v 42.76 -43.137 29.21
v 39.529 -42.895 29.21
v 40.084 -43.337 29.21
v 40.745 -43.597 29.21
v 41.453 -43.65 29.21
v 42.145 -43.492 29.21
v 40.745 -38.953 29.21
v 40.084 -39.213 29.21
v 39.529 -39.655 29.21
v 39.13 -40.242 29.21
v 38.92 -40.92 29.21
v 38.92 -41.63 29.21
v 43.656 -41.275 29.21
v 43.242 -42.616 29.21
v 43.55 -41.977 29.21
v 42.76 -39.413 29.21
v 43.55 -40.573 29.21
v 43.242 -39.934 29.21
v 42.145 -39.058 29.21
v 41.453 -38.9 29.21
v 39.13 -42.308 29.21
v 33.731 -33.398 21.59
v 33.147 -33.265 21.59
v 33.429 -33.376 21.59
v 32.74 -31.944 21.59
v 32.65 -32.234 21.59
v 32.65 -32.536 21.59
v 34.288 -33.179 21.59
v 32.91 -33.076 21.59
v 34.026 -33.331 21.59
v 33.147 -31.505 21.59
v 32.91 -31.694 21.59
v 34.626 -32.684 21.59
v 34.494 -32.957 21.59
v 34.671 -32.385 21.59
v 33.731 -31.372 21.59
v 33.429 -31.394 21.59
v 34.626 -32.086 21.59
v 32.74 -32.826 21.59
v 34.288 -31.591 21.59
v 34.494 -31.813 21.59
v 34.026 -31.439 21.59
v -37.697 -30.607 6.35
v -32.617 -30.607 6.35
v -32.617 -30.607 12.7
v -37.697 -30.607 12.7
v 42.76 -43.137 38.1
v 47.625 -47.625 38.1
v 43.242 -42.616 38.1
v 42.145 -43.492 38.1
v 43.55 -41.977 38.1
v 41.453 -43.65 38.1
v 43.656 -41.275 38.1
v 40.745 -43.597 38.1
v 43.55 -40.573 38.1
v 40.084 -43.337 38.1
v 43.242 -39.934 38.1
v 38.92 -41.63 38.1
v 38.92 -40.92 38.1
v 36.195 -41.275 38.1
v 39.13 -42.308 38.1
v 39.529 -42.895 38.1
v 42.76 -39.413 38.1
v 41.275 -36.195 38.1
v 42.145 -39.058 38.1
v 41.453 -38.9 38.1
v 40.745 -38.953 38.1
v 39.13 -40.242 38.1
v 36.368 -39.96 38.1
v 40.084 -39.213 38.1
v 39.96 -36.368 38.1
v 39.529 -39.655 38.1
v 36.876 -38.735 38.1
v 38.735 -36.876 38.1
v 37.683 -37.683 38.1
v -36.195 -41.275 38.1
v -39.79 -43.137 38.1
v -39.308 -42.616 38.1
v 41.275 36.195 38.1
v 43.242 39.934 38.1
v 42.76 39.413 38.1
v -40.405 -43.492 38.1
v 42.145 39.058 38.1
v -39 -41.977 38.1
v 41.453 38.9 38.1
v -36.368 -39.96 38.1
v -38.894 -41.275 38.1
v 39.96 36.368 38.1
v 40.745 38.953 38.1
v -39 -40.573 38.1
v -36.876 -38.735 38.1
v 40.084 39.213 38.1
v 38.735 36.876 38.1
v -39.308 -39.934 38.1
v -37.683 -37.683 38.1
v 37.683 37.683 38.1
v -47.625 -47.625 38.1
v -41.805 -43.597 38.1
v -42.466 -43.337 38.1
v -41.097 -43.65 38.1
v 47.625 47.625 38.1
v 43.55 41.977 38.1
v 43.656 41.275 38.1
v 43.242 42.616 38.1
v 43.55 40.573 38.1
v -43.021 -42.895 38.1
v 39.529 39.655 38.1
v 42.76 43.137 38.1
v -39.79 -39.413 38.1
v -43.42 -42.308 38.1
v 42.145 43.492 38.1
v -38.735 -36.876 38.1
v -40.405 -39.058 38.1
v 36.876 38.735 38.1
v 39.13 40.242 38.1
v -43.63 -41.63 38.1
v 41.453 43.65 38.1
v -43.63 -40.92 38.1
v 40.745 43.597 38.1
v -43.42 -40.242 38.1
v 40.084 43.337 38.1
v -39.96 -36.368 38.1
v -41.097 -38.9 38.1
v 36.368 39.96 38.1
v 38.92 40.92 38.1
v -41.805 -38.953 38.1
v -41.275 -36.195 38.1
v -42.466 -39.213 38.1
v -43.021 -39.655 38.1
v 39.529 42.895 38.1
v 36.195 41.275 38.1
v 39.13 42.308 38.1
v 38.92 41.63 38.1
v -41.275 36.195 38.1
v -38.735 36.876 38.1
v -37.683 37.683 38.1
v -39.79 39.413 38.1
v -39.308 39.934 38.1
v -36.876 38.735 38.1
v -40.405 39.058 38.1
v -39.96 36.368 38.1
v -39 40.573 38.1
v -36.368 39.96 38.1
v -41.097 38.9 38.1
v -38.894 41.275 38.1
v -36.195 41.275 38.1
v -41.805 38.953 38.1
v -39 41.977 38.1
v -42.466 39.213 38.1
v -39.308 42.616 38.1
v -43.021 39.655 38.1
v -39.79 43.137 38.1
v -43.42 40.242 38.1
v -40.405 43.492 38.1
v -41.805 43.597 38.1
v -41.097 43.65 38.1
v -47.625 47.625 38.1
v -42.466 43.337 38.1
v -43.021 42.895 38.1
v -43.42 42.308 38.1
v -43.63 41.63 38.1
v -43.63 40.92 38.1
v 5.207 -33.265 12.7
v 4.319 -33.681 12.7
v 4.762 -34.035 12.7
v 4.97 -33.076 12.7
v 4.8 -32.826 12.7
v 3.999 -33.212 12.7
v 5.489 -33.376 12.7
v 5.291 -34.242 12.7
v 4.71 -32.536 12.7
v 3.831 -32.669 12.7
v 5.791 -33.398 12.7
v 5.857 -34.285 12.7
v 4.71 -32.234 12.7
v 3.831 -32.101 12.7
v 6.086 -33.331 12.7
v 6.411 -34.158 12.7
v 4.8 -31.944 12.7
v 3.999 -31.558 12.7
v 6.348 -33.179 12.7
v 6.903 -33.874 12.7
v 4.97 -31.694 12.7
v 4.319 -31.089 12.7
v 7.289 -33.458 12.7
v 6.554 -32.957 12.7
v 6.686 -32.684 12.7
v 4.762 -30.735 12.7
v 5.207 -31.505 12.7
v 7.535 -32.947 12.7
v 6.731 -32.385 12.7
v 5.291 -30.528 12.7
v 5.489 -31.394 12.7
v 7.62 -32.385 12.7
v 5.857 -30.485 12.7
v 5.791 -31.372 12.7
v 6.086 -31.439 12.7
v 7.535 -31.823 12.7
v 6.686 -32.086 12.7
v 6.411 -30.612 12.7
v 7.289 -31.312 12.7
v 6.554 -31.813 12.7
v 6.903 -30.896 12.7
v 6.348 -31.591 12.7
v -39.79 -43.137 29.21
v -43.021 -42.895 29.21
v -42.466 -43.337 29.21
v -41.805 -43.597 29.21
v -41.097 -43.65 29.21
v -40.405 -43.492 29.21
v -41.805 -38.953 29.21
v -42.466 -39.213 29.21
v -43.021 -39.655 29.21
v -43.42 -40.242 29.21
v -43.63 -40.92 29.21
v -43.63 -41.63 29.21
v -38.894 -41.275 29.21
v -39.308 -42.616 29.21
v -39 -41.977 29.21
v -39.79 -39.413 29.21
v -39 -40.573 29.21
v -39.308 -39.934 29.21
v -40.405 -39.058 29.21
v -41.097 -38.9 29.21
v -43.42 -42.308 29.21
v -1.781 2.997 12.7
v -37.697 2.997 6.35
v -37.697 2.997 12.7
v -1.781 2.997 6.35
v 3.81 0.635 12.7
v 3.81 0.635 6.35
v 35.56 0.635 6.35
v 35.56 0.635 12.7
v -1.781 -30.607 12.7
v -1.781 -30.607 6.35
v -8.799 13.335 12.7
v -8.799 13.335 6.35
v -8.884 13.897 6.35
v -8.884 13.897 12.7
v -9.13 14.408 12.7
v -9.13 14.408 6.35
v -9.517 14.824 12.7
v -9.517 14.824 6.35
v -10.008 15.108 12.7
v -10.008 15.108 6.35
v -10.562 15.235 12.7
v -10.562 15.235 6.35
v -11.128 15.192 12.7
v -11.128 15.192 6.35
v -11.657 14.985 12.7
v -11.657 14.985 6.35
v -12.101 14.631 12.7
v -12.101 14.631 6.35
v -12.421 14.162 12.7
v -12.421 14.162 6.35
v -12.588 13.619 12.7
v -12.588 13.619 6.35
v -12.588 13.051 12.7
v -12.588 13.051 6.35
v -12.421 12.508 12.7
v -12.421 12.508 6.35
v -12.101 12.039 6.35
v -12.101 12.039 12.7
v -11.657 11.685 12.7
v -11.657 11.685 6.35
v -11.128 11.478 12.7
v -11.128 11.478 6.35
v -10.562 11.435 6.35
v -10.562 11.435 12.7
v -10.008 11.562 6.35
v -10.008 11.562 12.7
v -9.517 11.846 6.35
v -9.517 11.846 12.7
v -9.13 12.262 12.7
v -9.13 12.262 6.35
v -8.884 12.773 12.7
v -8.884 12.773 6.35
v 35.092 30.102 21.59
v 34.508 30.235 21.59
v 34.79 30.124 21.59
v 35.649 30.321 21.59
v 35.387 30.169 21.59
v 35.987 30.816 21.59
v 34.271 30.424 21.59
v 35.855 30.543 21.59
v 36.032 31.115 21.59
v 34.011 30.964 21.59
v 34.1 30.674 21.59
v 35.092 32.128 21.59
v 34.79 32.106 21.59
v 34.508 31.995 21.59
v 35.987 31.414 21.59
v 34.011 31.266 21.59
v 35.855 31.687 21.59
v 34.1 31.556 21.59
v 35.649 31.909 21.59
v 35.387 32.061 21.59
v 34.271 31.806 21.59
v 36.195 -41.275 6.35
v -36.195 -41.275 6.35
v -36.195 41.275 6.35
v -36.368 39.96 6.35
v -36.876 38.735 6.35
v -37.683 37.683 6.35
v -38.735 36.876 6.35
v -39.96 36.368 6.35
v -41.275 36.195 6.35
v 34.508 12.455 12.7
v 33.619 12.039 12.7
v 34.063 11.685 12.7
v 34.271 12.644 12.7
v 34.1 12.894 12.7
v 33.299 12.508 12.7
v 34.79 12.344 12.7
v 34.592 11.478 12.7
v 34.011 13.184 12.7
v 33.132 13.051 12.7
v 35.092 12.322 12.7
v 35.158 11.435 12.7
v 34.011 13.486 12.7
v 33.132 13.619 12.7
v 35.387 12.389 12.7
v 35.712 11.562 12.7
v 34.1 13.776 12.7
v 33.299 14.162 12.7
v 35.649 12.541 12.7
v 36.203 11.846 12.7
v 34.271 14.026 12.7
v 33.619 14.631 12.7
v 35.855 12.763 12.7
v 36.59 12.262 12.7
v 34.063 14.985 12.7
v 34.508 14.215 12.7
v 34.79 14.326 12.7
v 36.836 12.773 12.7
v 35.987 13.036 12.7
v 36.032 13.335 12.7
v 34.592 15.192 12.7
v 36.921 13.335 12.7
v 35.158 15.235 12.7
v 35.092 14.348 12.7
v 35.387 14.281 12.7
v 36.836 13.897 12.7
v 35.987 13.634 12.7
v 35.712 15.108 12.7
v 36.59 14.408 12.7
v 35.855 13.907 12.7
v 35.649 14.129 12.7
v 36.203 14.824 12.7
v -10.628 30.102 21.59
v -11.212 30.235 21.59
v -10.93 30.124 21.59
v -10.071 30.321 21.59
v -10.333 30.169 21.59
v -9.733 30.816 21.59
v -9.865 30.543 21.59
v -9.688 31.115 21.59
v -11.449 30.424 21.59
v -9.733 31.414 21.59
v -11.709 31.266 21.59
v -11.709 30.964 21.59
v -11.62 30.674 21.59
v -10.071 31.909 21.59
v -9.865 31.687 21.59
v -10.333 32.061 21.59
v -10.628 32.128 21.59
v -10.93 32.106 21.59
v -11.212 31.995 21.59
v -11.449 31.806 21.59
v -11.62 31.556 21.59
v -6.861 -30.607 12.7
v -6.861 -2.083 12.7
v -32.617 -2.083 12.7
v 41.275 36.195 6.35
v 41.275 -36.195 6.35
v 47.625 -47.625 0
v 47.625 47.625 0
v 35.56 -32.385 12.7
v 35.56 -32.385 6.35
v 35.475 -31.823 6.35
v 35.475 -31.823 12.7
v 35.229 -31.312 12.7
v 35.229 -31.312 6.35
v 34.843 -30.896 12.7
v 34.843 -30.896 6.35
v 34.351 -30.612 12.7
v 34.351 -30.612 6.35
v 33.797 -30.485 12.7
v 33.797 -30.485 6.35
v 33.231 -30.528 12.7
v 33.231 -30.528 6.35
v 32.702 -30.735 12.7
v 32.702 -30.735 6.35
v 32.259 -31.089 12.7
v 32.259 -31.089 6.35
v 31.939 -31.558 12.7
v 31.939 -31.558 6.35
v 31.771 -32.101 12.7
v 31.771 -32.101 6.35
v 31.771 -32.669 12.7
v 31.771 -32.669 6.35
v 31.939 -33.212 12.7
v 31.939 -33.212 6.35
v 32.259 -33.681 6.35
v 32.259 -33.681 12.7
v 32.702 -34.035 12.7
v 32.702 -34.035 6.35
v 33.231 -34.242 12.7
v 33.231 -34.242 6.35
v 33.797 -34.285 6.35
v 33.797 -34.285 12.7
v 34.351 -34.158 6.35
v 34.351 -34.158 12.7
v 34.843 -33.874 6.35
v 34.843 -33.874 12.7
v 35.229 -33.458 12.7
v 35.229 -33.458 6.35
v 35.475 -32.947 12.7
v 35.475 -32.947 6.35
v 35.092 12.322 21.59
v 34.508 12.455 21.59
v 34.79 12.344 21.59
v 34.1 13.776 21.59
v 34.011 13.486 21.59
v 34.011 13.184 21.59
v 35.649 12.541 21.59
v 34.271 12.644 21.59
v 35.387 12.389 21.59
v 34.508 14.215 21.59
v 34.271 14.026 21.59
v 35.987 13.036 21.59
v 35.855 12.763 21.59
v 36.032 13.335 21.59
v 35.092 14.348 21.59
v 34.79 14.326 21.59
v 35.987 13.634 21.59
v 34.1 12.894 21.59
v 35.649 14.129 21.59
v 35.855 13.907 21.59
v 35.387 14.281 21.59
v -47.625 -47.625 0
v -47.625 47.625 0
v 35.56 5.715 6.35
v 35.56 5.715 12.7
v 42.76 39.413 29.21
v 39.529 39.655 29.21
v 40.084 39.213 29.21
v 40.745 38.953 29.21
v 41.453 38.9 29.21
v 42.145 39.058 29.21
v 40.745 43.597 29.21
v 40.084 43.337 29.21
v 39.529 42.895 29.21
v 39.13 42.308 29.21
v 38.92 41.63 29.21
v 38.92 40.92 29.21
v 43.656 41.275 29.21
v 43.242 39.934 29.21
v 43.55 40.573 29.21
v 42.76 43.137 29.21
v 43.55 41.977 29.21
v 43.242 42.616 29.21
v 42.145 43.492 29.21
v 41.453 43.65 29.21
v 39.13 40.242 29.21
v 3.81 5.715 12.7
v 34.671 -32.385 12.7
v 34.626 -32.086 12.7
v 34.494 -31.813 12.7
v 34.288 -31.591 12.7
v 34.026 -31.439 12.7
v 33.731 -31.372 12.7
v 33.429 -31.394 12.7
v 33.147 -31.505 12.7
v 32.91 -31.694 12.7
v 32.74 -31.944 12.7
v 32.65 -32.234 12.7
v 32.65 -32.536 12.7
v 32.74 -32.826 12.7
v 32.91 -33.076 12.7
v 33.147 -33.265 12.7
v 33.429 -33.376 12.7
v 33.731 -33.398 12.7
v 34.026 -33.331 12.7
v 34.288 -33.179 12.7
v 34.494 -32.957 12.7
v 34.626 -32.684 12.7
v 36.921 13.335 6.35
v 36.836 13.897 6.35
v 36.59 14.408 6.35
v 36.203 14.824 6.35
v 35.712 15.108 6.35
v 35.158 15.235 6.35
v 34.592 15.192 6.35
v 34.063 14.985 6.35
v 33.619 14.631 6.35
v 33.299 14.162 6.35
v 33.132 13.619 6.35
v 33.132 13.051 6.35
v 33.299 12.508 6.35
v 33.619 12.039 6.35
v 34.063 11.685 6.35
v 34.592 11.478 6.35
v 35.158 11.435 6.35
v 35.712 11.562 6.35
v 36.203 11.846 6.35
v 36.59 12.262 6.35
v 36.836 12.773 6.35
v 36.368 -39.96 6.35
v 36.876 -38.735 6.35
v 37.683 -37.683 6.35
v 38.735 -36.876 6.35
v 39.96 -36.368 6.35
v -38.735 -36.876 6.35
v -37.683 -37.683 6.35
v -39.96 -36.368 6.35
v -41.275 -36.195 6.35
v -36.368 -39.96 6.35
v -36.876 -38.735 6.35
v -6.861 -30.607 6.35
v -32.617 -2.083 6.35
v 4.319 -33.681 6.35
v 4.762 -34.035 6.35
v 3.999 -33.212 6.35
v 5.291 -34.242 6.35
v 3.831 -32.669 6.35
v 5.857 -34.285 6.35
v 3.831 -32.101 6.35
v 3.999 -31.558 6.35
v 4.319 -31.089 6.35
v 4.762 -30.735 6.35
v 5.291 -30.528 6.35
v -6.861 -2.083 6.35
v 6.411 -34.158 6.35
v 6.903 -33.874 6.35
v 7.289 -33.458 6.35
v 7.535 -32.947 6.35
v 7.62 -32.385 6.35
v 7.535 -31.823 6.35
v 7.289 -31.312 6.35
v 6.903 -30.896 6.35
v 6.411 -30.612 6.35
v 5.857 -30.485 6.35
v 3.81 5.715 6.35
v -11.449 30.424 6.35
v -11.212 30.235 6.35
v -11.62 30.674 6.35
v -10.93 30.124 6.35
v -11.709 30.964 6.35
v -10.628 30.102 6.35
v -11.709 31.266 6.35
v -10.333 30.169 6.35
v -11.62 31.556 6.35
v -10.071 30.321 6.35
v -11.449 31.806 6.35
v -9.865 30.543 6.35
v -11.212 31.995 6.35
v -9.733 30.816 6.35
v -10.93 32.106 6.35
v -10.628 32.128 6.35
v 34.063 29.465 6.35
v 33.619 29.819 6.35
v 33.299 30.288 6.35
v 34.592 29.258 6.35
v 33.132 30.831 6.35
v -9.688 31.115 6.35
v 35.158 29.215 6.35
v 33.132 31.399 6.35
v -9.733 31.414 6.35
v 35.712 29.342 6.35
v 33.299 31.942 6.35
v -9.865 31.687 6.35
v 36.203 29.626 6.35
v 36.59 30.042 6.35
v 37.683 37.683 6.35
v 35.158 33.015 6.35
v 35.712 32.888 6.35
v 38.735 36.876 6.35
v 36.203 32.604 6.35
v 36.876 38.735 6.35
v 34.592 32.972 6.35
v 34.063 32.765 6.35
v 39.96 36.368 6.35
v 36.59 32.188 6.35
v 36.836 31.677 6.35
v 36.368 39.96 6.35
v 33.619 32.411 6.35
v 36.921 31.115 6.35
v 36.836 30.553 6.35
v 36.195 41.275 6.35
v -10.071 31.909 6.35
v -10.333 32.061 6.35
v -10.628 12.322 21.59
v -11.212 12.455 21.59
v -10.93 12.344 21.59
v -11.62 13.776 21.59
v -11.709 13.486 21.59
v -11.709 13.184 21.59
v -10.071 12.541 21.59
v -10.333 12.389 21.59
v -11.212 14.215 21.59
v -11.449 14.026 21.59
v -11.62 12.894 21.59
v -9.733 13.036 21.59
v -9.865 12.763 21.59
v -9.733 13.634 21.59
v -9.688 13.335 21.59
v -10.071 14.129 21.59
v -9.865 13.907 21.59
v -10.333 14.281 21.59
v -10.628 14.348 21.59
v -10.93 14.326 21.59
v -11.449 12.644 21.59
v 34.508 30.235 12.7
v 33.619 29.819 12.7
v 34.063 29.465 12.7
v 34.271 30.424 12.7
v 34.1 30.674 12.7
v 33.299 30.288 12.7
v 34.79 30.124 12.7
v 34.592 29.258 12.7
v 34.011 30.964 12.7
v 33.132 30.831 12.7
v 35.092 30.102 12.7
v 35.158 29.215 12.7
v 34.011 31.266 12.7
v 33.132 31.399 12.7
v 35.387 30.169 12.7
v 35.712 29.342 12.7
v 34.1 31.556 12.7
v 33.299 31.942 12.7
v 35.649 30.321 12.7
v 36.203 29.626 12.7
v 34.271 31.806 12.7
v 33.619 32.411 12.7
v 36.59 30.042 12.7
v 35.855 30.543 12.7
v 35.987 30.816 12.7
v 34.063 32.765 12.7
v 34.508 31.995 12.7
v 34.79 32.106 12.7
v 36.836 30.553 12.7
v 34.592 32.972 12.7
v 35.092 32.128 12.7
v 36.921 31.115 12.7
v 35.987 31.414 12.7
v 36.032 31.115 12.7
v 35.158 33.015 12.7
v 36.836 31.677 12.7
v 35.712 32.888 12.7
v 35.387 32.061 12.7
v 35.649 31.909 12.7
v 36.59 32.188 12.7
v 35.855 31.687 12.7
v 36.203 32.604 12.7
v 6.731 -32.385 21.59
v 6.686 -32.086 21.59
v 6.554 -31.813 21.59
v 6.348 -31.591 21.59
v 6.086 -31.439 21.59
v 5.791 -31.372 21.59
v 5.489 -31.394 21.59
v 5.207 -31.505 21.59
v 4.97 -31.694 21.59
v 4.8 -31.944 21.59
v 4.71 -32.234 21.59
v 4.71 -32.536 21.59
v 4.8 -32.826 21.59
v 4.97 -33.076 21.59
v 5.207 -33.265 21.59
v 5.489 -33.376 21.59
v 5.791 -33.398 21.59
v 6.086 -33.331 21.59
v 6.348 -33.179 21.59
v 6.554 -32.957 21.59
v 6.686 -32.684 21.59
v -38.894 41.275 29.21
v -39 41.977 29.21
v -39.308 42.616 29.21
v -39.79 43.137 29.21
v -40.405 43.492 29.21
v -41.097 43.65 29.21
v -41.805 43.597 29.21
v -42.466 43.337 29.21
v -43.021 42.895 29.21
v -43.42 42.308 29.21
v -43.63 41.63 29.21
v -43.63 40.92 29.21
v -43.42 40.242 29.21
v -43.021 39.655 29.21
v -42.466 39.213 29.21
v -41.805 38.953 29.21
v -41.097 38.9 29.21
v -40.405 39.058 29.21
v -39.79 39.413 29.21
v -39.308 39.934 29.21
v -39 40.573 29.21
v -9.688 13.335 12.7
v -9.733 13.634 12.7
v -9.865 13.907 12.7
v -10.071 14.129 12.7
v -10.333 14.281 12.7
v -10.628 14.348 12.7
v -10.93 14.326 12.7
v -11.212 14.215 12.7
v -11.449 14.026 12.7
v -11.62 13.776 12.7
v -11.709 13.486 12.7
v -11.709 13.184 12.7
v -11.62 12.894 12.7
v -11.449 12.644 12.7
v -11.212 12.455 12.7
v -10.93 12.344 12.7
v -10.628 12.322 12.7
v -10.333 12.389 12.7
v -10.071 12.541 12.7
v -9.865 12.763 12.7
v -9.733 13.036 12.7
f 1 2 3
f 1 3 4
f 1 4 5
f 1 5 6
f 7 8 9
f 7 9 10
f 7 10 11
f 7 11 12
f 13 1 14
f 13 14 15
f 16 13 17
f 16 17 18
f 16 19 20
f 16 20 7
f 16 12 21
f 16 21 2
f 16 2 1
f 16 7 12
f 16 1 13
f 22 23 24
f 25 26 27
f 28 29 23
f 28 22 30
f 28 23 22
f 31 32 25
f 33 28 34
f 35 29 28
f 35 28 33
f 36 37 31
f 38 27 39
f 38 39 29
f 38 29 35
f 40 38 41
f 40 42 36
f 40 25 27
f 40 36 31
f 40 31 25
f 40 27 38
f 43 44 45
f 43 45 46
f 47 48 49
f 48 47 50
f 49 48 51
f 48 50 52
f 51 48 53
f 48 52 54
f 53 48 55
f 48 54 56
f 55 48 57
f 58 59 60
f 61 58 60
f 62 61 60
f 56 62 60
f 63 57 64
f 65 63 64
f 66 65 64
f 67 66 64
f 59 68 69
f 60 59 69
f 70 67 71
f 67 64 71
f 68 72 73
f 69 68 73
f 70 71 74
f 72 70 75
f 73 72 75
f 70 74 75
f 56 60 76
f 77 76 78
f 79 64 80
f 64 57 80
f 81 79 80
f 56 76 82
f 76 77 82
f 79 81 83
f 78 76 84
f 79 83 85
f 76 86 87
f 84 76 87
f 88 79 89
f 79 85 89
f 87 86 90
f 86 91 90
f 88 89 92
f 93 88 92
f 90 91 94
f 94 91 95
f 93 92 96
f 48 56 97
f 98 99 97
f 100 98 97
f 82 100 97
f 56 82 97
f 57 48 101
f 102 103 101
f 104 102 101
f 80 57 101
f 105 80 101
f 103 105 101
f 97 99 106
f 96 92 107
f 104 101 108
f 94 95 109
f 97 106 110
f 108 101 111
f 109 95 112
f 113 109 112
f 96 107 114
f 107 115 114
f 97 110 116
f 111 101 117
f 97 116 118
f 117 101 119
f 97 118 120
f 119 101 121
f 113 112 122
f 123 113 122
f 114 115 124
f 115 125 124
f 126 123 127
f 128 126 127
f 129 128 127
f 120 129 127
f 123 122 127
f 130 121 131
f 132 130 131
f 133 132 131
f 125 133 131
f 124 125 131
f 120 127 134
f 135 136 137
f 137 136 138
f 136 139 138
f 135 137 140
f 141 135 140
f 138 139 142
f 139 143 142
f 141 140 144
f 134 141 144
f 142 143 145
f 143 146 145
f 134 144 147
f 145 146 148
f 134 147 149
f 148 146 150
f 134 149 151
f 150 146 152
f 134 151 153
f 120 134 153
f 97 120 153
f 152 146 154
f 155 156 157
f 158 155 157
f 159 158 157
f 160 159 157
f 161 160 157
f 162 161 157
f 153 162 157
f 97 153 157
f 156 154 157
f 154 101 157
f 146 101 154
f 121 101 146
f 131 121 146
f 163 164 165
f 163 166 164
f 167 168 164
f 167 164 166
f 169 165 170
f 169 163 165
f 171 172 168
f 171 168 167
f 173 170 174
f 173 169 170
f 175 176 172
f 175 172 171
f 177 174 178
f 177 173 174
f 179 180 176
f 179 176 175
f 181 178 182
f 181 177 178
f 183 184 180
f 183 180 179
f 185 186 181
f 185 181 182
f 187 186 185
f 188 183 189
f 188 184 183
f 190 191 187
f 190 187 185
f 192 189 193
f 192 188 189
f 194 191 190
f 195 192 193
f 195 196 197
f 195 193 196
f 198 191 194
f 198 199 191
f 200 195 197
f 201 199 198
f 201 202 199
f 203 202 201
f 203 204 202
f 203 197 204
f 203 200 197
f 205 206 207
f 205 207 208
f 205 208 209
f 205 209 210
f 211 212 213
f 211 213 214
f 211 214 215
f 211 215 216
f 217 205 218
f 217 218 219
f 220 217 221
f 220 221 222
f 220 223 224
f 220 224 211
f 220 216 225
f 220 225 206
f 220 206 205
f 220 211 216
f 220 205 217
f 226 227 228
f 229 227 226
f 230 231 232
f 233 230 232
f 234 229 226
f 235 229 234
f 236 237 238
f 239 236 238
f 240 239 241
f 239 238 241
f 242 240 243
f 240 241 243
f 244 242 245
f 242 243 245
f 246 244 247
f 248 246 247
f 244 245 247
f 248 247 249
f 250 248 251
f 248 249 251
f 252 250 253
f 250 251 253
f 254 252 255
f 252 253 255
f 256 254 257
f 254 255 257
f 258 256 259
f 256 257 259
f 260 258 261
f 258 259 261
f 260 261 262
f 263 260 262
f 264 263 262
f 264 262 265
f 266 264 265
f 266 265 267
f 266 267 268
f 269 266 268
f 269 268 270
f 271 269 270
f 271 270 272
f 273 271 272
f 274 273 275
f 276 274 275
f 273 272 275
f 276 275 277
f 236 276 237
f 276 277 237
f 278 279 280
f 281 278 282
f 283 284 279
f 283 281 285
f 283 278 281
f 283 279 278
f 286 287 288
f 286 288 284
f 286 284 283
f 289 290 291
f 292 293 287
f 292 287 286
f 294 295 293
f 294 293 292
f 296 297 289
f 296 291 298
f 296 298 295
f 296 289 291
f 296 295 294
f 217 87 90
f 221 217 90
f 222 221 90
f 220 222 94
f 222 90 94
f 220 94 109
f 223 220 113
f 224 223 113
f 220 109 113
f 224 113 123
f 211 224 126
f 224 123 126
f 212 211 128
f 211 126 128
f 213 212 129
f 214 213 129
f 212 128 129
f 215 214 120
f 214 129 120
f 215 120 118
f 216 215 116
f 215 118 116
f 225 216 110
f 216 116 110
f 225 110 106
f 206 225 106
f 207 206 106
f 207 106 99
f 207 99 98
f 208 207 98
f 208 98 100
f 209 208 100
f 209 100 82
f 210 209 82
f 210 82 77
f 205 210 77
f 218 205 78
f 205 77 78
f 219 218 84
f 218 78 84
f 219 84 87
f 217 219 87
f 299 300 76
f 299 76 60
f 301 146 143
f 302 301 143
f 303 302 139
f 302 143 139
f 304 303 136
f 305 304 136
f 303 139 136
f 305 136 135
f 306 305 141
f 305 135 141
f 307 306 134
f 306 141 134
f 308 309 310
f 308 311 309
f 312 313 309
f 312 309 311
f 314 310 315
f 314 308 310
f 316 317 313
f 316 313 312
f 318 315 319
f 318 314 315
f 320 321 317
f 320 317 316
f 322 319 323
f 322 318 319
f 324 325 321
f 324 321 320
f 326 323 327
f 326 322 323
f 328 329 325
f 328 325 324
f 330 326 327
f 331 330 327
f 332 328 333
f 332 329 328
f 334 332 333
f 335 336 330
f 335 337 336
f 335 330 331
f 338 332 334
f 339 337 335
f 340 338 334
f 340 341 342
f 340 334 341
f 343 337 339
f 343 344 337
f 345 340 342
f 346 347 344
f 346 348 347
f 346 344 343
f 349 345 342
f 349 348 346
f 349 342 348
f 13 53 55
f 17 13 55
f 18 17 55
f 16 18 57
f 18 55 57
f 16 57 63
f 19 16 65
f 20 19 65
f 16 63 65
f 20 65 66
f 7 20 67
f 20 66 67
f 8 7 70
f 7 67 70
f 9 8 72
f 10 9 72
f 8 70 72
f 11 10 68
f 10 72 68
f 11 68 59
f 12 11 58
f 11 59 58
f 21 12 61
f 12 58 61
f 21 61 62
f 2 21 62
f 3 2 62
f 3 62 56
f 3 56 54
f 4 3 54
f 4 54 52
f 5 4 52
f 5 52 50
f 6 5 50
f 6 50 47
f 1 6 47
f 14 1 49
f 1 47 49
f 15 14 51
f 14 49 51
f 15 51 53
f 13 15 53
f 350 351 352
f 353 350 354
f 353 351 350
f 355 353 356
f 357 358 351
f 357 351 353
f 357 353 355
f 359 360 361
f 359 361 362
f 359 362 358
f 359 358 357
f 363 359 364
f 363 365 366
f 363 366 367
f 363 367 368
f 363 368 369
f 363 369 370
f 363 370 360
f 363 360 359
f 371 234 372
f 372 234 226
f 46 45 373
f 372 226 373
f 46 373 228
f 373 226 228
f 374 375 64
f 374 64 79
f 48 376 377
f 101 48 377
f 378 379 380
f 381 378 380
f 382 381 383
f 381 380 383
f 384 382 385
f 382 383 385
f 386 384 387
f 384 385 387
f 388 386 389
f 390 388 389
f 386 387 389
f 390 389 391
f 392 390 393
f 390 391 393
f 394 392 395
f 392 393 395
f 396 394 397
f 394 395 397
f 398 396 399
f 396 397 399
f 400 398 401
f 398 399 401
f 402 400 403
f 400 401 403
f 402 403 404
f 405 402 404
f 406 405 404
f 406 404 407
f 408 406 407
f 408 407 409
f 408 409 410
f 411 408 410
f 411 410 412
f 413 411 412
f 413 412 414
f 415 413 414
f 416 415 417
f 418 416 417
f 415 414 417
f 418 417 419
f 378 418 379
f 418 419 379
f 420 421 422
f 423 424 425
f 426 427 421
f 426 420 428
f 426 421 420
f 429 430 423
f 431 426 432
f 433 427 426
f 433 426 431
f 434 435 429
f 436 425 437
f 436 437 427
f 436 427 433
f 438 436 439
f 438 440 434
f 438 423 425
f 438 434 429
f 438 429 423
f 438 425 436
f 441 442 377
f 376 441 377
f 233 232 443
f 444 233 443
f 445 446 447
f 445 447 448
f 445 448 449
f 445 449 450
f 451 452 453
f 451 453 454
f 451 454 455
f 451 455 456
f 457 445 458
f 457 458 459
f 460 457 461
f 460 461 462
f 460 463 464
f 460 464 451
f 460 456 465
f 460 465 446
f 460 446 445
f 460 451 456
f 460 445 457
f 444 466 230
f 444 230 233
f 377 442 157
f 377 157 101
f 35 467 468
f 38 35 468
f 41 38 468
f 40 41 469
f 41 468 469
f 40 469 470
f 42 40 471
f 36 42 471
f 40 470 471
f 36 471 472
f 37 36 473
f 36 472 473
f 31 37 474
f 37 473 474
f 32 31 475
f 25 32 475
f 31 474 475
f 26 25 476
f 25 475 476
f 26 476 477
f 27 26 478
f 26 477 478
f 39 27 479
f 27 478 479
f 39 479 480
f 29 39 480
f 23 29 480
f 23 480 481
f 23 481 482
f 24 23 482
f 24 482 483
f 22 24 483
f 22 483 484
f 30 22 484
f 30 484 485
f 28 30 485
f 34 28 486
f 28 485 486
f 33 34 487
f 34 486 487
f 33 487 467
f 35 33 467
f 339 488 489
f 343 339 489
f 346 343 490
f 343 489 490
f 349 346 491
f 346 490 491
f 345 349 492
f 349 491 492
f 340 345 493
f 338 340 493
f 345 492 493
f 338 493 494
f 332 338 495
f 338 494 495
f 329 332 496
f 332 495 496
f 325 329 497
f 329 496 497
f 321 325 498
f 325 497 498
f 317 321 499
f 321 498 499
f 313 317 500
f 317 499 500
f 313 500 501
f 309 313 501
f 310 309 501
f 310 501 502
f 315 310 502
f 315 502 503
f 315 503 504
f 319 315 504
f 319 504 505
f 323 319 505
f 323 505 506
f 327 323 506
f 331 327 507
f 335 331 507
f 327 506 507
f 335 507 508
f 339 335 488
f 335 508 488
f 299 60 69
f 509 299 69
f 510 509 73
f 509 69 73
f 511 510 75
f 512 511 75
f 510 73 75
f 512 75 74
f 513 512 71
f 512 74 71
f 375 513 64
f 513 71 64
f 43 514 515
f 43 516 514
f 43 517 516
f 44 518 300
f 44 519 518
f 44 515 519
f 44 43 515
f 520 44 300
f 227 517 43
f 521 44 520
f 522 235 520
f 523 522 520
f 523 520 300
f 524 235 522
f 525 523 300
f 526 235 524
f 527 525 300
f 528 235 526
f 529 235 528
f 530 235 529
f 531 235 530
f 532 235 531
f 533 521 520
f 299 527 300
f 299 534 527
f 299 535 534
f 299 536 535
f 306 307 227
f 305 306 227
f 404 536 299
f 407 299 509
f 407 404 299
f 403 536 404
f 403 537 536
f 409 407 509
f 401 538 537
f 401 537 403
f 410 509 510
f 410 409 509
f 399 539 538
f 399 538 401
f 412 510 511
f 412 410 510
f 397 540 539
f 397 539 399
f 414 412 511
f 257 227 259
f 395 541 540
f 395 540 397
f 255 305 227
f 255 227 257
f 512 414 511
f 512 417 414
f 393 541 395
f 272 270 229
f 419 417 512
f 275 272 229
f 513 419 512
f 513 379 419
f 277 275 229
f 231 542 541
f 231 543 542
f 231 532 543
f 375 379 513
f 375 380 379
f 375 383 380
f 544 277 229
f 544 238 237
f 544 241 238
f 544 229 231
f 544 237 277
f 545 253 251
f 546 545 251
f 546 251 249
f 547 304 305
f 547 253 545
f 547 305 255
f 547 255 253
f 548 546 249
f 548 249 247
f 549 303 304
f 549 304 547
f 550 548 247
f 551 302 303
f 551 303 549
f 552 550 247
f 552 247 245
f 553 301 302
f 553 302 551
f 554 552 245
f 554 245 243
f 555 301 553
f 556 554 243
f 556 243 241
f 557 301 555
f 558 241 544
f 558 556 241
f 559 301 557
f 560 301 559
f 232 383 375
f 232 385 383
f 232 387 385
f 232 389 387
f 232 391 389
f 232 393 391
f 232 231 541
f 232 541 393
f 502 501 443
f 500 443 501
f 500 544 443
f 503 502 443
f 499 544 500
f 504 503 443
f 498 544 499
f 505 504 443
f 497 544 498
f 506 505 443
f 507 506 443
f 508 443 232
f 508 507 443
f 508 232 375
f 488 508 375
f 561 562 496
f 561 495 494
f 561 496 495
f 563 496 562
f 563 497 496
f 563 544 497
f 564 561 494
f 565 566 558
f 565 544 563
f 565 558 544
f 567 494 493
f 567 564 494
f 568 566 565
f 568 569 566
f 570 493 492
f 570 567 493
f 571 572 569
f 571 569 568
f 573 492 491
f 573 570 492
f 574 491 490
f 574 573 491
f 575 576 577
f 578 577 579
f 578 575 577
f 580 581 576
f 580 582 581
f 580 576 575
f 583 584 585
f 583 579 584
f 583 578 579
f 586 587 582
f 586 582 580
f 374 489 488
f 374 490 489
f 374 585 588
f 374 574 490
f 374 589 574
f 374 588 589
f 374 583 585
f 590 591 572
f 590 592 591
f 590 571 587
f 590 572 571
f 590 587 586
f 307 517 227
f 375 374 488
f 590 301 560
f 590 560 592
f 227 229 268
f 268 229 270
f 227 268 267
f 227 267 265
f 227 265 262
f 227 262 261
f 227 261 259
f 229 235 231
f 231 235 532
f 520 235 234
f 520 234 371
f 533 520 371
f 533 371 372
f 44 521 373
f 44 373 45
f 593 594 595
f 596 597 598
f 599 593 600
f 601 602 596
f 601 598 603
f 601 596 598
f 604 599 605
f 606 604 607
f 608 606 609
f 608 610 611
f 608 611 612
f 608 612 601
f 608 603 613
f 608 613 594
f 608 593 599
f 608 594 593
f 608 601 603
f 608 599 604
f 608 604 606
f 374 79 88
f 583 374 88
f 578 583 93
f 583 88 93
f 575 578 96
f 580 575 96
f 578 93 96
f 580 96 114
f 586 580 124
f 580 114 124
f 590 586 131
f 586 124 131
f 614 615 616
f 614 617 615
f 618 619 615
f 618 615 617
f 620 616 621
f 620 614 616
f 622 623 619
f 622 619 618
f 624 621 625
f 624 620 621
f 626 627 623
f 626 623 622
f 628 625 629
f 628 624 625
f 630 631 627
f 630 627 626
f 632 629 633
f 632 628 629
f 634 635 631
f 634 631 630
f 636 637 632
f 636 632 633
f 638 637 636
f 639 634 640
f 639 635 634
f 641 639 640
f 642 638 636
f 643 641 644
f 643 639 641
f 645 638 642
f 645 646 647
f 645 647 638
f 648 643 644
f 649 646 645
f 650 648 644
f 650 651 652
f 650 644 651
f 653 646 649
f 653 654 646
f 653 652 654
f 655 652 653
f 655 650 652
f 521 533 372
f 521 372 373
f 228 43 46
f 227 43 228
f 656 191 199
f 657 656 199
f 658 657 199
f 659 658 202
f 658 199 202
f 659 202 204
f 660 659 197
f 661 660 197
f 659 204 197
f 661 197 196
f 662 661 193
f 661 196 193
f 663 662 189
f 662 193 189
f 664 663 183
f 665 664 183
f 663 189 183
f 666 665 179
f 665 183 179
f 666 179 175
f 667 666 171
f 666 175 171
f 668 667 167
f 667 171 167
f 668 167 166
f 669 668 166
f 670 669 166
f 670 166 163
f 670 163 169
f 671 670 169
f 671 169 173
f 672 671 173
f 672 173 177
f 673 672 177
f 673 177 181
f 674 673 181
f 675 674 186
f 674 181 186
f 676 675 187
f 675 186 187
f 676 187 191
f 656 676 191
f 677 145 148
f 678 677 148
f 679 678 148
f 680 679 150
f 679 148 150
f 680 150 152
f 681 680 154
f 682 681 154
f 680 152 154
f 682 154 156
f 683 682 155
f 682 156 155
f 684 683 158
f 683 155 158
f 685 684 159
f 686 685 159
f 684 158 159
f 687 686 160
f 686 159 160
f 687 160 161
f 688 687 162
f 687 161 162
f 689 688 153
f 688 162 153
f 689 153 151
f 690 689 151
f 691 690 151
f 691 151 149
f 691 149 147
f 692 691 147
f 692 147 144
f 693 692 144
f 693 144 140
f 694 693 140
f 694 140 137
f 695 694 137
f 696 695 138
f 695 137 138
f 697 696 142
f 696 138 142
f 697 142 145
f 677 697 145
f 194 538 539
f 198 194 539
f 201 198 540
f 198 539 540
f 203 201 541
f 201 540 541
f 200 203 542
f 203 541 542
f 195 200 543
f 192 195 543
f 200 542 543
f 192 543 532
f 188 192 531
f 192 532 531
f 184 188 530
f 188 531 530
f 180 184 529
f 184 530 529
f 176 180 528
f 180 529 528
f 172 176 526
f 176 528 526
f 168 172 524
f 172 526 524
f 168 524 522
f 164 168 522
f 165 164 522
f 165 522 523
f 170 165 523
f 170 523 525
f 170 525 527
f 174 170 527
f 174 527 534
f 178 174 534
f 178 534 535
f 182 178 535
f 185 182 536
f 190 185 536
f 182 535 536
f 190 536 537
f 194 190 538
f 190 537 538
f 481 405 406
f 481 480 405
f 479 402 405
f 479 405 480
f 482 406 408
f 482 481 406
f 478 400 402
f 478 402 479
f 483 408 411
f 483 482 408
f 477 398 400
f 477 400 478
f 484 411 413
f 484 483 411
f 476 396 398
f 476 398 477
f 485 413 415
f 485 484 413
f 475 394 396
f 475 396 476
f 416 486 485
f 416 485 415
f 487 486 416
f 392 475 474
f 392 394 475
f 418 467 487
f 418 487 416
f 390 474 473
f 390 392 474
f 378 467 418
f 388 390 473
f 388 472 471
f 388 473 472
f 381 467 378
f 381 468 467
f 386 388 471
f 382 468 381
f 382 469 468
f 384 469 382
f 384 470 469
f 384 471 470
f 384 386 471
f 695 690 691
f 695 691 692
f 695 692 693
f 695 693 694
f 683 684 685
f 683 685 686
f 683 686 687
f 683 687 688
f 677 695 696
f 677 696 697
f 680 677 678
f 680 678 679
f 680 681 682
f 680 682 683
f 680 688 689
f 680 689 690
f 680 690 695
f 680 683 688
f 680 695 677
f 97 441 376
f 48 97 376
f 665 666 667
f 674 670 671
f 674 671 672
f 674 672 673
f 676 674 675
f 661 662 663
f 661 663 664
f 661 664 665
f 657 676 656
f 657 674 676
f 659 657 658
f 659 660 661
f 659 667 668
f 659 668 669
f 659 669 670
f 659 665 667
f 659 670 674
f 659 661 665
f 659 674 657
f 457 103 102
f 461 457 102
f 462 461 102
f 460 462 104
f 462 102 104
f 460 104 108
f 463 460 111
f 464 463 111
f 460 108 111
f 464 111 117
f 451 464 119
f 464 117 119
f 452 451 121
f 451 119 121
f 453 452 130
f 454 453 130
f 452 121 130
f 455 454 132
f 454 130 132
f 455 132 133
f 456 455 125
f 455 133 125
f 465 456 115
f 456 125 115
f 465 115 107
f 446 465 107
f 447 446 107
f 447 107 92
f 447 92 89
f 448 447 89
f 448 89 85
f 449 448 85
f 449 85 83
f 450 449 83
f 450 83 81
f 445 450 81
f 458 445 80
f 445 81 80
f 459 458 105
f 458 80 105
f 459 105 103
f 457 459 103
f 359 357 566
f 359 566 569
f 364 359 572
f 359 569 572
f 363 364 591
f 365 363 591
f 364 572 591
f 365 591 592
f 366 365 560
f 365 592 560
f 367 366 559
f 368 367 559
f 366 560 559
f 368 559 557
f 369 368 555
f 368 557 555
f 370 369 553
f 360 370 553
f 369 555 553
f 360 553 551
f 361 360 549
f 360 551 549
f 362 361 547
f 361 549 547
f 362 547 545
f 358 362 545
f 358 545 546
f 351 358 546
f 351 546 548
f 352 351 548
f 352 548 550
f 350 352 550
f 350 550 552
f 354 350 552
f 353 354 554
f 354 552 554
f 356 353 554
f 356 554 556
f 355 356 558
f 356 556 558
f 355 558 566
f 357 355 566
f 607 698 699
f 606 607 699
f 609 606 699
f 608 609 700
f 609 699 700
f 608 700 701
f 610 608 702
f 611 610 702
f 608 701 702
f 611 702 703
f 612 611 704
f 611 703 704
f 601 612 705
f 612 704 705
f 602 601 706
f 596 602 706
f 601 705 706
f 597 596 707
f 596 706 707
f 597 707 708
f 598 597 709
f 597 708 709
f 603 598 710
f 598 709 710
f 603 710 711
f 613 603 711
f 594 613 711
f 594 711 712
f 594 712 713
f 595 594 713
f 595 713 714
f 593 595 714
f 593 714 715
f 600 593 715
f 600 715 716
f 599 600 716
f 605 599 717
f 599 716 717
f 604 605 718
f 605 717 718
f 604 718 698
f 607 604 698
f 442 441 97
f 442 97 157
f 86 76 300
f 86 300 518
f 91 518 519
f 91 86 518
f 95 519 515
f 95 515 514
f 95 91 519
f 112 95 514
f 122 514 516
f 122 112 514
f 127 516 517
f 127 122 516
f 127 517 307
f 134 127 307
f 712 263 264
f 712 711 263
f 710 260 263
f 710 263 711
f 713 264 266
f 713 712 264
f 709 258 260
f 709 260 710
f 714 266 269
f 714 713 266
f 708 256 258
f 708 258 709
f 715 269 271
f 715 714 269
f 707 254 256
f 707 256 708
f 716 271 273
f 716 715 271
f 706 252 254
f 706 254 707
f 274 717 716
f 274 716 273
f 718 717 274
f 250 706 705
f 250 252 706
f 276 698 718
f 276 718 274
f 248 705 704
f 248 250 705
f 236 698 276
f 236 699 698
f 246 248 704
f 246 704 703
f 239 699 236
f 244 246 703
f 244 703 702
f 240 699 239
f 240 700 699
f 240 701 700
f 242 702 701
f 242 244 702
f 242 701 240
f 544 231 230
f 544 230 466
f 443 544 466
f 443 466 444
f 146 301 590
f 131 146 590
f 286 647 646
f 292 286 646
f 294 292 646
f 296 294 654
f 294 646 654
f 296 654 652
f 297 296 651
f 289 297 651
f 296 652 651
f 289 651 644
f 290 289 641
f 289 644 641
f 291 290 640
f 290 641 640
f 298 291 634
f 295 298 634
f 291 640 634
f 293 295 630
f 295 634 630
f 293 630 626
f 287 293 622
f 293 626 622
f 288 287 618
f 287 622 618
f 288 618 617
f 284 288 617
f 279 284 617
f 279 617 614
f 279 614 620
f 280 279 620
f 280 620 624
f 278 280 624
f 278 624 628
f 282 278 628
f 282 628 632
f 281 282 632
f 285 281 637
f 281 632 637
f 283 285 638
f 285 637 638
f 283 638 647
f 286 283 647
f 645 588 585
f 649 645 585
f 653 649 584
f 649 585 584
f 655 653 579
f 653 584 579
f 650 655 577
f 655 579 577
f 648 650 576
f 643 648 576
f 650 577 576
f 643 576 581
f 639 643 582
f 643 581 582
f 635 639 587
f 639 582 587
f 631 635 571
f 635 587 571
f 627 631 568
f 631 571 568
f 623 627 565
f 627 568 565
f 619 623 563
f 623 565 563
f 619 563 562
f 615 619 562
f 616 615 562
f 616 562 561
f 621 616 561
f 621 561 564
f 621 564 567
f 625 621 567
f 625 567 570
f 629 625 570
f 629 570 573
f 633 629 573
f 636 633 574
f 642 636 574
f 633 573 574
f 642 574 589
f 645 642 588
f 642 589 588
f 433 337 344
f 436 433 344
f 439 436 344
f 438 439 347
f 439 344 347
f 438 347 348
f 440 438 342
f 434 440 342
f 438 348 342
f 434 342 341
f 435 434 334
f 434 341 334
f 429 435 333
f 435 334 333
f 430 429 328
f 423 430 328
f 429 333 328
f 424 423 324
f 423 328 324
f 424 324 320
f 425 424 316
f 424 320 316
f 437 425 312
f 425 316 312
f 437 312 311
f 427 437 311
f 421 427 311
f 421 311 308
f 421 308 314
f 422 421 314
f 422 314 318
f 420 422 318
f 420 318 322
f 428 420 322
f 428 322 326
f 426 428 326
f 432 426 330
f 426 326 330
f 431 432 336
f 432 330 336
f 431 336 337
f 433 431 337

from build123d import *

# Parameters (mm, degrees)
SKETCH1_W           = 95.25
SKETCH1_H           = 95.25
BOSS_EXTRUDE1_DEPTH = 38.1
SHELL1_T            = -6.35
BOSS_EXTRUDE2_DEPTH = 31.75
SKETCH3_R           = 1.905
SKETCH3_R_2         = 1.016
BOSS_EXTRUDE3_DEPTH = 6.35
SKETCH4_R           = 1.016
BOSS_EXTRUDE4_DEPTH = 8.89
SKETCH5_R           = 1.905
SKETCH5_W           = 31.75
SKETCH5_H           = 5.08
BOSS_EXTRUDE5_DEPTH = 6.35
SKETCH7_R           = 1.016
BOSS_EXTRUDE6_DEPTH = 8.89
SKETCH8_R           = 2.38125
CUT_EXTRUDE1_DEPTH  = 8.89
BOSS_EXTRUDE7_DEPTH = 6.35


with BuildPart() as part:
    # Sketch1 → Boss-Extrude1 (new body)
    with BuildSketch(Plane.XY):
        Rectangle(SKETCH1_W, SKETCH1_H)
    extrude(amount=BOSS_EXTRUDE1_DEPTH)

    # Shell1
    shell1_openings = [part.faces().sort_by_distance(p)[0] for p in [
        (0, 0, 38.1),
    ]]
    offset(amount=SHELL1_T, openings=shell1_openings, kind=Kind.INTERSECTION)

    # Sketch2 → Boss-Extrude2 (add)
    with BuildSketch(Plane.XY.offset(38.1)):
        with BuildLine():
            Line((-41.275, 41.275), (-36.195, 41.275))
            ThreePointArc((-36.195, 41.275), (-37.682897552, 37.682897552), (-41.275, 36.195))
            Line((-41.275, 36.195), (-41.275, 41.275))
        make_face()
        with BuildLine():
            Line((36.195, 41.275), (41.275, 41.275))
            Line((41.275, 41.275), (41.275, 36.195))
            ThreePointArc((41.275, 36.195), (37.682897552, 37.682897552), (36.195, 41.275))
        make_face()
        with BuildLine():
            Line((41.275, -36.195), (41.275, -41.275))
            Line((41.275, -41.275), (36.195, -41.275))
            ThreePointArc((36.195, -41.275), (37.682897552, -37.682897552), (41.275, -36.195))
        make_face()
        with BuildLine():
            Line((-41.275, -36.195), (-41.275, -41.275))
            Line((-41.275, -41.275), (-36.195, -41.275))
            ThreePointArc((-36.195, -41.275), (-37.682897552, -37.682897552), (-41.275, -36.195))
        make_face()
    extrude(amount=-BOSS_EXTRUDE2_DEPTH)

    # Sketch3 → Boss-Extrude3 (add)
    with BuildSketch(Plane.XY.offset(6.35)):
        with Locations((35.015710728, 31.115)):
            Circle(SKETCH3_R)
        with Locations((-10.704289272, 31.115)):
            Circle(SKETCH3_R_2)
        with Locations((-10.704289272, 13.335)):
            Circle(SKETCH3_R)
        with Locations((35.015710728, 13.335)):
            Circle(SKETCH3_R)
    extrude(amount=BOSS_EXTRUDE3_DEPTH)

    # Sketch4 → Boss-Extrude4 (add)
    with BuildSketch(Plane.XY.offset(12.7)):
        with Locations((-10.704289272, 31.115)):
            Circle(SKETCH4_R)
        with Locations((-10.704289272, 13.335)):
            Circle(SKETCH4_R)
        with Locations((35.015710728, 31.115)):
            Circle(SKETCH4_R)
        with Locations((35.015710728, 13.335)):
            Circle(SKETCH4_R)
    extrude(amount=BOSS_EXTRUDE4_DEPTH)

    # Sketch5 → Boss-Extrude5 (add)
    with BuildSketch(Plane.XY.offset(6.35)):
        with Locations((5.715, -32.385)):
            Circle(SKETCH5_R)
        with Locations((33.655, -32.385)):
            Circle(SKETCH5_R)
        with Locations((19.685, 3.175)):
            Rectangle(SKETCH5_W, SKETCH5_H)
    extrude(amount=BOSS_EXTRUDE5_DEPTH)

    # Sketch7 → Boss-Extrude6 (add)
    with BuildSketch(Plane.XY.offset(12.7)):
        with Locations((5.715, -32.385)):
            Circle(SKETCH7_R)
        with Locations((33.655, -32.385)):
            Circle(SKETCH7_R)
    extrude(amount=BOSS_EXTRUDE6_DEPTH)

    # Sketch8 → Cut-Extrude1 (cut)
    with BuildSketch(Plane.XY.offset(38.1)):
        with Locations((-41.275, 41.275)):
            Circle(SKETCH8_R)
        with Locations((41.275, 41.275)):
            Circle(SKETCH8_R)
        with Locations((41.275, -41.275)):
            Circle(SKETCH8_R)
        with Locations((-41.275, -41.275)):
            Circle(SKETCH8_R)
    extrude(amount=-CUT_EXTRUDE1_DEPTH, mode=Mode.SUBTRACT)

    # Sketch10 → Boss-Extrude7 (add)
    with BuildSketch(Plane.XY.offset(6.35)):
        Polygon((-37.696932409, -30.607), (-37.696932409, 2.9972), (-1.781332409, 2.9972), (-1.781332409, -30.607), (-6.861332409, -30.607), (-6.861332409, -2.0828), (-32.616932409, -2.0828), (-32.616932409, -30.607), align=None)
    extrude(amount=BOSS_EXTRUDE7_DEPTH)


solid = part.part
